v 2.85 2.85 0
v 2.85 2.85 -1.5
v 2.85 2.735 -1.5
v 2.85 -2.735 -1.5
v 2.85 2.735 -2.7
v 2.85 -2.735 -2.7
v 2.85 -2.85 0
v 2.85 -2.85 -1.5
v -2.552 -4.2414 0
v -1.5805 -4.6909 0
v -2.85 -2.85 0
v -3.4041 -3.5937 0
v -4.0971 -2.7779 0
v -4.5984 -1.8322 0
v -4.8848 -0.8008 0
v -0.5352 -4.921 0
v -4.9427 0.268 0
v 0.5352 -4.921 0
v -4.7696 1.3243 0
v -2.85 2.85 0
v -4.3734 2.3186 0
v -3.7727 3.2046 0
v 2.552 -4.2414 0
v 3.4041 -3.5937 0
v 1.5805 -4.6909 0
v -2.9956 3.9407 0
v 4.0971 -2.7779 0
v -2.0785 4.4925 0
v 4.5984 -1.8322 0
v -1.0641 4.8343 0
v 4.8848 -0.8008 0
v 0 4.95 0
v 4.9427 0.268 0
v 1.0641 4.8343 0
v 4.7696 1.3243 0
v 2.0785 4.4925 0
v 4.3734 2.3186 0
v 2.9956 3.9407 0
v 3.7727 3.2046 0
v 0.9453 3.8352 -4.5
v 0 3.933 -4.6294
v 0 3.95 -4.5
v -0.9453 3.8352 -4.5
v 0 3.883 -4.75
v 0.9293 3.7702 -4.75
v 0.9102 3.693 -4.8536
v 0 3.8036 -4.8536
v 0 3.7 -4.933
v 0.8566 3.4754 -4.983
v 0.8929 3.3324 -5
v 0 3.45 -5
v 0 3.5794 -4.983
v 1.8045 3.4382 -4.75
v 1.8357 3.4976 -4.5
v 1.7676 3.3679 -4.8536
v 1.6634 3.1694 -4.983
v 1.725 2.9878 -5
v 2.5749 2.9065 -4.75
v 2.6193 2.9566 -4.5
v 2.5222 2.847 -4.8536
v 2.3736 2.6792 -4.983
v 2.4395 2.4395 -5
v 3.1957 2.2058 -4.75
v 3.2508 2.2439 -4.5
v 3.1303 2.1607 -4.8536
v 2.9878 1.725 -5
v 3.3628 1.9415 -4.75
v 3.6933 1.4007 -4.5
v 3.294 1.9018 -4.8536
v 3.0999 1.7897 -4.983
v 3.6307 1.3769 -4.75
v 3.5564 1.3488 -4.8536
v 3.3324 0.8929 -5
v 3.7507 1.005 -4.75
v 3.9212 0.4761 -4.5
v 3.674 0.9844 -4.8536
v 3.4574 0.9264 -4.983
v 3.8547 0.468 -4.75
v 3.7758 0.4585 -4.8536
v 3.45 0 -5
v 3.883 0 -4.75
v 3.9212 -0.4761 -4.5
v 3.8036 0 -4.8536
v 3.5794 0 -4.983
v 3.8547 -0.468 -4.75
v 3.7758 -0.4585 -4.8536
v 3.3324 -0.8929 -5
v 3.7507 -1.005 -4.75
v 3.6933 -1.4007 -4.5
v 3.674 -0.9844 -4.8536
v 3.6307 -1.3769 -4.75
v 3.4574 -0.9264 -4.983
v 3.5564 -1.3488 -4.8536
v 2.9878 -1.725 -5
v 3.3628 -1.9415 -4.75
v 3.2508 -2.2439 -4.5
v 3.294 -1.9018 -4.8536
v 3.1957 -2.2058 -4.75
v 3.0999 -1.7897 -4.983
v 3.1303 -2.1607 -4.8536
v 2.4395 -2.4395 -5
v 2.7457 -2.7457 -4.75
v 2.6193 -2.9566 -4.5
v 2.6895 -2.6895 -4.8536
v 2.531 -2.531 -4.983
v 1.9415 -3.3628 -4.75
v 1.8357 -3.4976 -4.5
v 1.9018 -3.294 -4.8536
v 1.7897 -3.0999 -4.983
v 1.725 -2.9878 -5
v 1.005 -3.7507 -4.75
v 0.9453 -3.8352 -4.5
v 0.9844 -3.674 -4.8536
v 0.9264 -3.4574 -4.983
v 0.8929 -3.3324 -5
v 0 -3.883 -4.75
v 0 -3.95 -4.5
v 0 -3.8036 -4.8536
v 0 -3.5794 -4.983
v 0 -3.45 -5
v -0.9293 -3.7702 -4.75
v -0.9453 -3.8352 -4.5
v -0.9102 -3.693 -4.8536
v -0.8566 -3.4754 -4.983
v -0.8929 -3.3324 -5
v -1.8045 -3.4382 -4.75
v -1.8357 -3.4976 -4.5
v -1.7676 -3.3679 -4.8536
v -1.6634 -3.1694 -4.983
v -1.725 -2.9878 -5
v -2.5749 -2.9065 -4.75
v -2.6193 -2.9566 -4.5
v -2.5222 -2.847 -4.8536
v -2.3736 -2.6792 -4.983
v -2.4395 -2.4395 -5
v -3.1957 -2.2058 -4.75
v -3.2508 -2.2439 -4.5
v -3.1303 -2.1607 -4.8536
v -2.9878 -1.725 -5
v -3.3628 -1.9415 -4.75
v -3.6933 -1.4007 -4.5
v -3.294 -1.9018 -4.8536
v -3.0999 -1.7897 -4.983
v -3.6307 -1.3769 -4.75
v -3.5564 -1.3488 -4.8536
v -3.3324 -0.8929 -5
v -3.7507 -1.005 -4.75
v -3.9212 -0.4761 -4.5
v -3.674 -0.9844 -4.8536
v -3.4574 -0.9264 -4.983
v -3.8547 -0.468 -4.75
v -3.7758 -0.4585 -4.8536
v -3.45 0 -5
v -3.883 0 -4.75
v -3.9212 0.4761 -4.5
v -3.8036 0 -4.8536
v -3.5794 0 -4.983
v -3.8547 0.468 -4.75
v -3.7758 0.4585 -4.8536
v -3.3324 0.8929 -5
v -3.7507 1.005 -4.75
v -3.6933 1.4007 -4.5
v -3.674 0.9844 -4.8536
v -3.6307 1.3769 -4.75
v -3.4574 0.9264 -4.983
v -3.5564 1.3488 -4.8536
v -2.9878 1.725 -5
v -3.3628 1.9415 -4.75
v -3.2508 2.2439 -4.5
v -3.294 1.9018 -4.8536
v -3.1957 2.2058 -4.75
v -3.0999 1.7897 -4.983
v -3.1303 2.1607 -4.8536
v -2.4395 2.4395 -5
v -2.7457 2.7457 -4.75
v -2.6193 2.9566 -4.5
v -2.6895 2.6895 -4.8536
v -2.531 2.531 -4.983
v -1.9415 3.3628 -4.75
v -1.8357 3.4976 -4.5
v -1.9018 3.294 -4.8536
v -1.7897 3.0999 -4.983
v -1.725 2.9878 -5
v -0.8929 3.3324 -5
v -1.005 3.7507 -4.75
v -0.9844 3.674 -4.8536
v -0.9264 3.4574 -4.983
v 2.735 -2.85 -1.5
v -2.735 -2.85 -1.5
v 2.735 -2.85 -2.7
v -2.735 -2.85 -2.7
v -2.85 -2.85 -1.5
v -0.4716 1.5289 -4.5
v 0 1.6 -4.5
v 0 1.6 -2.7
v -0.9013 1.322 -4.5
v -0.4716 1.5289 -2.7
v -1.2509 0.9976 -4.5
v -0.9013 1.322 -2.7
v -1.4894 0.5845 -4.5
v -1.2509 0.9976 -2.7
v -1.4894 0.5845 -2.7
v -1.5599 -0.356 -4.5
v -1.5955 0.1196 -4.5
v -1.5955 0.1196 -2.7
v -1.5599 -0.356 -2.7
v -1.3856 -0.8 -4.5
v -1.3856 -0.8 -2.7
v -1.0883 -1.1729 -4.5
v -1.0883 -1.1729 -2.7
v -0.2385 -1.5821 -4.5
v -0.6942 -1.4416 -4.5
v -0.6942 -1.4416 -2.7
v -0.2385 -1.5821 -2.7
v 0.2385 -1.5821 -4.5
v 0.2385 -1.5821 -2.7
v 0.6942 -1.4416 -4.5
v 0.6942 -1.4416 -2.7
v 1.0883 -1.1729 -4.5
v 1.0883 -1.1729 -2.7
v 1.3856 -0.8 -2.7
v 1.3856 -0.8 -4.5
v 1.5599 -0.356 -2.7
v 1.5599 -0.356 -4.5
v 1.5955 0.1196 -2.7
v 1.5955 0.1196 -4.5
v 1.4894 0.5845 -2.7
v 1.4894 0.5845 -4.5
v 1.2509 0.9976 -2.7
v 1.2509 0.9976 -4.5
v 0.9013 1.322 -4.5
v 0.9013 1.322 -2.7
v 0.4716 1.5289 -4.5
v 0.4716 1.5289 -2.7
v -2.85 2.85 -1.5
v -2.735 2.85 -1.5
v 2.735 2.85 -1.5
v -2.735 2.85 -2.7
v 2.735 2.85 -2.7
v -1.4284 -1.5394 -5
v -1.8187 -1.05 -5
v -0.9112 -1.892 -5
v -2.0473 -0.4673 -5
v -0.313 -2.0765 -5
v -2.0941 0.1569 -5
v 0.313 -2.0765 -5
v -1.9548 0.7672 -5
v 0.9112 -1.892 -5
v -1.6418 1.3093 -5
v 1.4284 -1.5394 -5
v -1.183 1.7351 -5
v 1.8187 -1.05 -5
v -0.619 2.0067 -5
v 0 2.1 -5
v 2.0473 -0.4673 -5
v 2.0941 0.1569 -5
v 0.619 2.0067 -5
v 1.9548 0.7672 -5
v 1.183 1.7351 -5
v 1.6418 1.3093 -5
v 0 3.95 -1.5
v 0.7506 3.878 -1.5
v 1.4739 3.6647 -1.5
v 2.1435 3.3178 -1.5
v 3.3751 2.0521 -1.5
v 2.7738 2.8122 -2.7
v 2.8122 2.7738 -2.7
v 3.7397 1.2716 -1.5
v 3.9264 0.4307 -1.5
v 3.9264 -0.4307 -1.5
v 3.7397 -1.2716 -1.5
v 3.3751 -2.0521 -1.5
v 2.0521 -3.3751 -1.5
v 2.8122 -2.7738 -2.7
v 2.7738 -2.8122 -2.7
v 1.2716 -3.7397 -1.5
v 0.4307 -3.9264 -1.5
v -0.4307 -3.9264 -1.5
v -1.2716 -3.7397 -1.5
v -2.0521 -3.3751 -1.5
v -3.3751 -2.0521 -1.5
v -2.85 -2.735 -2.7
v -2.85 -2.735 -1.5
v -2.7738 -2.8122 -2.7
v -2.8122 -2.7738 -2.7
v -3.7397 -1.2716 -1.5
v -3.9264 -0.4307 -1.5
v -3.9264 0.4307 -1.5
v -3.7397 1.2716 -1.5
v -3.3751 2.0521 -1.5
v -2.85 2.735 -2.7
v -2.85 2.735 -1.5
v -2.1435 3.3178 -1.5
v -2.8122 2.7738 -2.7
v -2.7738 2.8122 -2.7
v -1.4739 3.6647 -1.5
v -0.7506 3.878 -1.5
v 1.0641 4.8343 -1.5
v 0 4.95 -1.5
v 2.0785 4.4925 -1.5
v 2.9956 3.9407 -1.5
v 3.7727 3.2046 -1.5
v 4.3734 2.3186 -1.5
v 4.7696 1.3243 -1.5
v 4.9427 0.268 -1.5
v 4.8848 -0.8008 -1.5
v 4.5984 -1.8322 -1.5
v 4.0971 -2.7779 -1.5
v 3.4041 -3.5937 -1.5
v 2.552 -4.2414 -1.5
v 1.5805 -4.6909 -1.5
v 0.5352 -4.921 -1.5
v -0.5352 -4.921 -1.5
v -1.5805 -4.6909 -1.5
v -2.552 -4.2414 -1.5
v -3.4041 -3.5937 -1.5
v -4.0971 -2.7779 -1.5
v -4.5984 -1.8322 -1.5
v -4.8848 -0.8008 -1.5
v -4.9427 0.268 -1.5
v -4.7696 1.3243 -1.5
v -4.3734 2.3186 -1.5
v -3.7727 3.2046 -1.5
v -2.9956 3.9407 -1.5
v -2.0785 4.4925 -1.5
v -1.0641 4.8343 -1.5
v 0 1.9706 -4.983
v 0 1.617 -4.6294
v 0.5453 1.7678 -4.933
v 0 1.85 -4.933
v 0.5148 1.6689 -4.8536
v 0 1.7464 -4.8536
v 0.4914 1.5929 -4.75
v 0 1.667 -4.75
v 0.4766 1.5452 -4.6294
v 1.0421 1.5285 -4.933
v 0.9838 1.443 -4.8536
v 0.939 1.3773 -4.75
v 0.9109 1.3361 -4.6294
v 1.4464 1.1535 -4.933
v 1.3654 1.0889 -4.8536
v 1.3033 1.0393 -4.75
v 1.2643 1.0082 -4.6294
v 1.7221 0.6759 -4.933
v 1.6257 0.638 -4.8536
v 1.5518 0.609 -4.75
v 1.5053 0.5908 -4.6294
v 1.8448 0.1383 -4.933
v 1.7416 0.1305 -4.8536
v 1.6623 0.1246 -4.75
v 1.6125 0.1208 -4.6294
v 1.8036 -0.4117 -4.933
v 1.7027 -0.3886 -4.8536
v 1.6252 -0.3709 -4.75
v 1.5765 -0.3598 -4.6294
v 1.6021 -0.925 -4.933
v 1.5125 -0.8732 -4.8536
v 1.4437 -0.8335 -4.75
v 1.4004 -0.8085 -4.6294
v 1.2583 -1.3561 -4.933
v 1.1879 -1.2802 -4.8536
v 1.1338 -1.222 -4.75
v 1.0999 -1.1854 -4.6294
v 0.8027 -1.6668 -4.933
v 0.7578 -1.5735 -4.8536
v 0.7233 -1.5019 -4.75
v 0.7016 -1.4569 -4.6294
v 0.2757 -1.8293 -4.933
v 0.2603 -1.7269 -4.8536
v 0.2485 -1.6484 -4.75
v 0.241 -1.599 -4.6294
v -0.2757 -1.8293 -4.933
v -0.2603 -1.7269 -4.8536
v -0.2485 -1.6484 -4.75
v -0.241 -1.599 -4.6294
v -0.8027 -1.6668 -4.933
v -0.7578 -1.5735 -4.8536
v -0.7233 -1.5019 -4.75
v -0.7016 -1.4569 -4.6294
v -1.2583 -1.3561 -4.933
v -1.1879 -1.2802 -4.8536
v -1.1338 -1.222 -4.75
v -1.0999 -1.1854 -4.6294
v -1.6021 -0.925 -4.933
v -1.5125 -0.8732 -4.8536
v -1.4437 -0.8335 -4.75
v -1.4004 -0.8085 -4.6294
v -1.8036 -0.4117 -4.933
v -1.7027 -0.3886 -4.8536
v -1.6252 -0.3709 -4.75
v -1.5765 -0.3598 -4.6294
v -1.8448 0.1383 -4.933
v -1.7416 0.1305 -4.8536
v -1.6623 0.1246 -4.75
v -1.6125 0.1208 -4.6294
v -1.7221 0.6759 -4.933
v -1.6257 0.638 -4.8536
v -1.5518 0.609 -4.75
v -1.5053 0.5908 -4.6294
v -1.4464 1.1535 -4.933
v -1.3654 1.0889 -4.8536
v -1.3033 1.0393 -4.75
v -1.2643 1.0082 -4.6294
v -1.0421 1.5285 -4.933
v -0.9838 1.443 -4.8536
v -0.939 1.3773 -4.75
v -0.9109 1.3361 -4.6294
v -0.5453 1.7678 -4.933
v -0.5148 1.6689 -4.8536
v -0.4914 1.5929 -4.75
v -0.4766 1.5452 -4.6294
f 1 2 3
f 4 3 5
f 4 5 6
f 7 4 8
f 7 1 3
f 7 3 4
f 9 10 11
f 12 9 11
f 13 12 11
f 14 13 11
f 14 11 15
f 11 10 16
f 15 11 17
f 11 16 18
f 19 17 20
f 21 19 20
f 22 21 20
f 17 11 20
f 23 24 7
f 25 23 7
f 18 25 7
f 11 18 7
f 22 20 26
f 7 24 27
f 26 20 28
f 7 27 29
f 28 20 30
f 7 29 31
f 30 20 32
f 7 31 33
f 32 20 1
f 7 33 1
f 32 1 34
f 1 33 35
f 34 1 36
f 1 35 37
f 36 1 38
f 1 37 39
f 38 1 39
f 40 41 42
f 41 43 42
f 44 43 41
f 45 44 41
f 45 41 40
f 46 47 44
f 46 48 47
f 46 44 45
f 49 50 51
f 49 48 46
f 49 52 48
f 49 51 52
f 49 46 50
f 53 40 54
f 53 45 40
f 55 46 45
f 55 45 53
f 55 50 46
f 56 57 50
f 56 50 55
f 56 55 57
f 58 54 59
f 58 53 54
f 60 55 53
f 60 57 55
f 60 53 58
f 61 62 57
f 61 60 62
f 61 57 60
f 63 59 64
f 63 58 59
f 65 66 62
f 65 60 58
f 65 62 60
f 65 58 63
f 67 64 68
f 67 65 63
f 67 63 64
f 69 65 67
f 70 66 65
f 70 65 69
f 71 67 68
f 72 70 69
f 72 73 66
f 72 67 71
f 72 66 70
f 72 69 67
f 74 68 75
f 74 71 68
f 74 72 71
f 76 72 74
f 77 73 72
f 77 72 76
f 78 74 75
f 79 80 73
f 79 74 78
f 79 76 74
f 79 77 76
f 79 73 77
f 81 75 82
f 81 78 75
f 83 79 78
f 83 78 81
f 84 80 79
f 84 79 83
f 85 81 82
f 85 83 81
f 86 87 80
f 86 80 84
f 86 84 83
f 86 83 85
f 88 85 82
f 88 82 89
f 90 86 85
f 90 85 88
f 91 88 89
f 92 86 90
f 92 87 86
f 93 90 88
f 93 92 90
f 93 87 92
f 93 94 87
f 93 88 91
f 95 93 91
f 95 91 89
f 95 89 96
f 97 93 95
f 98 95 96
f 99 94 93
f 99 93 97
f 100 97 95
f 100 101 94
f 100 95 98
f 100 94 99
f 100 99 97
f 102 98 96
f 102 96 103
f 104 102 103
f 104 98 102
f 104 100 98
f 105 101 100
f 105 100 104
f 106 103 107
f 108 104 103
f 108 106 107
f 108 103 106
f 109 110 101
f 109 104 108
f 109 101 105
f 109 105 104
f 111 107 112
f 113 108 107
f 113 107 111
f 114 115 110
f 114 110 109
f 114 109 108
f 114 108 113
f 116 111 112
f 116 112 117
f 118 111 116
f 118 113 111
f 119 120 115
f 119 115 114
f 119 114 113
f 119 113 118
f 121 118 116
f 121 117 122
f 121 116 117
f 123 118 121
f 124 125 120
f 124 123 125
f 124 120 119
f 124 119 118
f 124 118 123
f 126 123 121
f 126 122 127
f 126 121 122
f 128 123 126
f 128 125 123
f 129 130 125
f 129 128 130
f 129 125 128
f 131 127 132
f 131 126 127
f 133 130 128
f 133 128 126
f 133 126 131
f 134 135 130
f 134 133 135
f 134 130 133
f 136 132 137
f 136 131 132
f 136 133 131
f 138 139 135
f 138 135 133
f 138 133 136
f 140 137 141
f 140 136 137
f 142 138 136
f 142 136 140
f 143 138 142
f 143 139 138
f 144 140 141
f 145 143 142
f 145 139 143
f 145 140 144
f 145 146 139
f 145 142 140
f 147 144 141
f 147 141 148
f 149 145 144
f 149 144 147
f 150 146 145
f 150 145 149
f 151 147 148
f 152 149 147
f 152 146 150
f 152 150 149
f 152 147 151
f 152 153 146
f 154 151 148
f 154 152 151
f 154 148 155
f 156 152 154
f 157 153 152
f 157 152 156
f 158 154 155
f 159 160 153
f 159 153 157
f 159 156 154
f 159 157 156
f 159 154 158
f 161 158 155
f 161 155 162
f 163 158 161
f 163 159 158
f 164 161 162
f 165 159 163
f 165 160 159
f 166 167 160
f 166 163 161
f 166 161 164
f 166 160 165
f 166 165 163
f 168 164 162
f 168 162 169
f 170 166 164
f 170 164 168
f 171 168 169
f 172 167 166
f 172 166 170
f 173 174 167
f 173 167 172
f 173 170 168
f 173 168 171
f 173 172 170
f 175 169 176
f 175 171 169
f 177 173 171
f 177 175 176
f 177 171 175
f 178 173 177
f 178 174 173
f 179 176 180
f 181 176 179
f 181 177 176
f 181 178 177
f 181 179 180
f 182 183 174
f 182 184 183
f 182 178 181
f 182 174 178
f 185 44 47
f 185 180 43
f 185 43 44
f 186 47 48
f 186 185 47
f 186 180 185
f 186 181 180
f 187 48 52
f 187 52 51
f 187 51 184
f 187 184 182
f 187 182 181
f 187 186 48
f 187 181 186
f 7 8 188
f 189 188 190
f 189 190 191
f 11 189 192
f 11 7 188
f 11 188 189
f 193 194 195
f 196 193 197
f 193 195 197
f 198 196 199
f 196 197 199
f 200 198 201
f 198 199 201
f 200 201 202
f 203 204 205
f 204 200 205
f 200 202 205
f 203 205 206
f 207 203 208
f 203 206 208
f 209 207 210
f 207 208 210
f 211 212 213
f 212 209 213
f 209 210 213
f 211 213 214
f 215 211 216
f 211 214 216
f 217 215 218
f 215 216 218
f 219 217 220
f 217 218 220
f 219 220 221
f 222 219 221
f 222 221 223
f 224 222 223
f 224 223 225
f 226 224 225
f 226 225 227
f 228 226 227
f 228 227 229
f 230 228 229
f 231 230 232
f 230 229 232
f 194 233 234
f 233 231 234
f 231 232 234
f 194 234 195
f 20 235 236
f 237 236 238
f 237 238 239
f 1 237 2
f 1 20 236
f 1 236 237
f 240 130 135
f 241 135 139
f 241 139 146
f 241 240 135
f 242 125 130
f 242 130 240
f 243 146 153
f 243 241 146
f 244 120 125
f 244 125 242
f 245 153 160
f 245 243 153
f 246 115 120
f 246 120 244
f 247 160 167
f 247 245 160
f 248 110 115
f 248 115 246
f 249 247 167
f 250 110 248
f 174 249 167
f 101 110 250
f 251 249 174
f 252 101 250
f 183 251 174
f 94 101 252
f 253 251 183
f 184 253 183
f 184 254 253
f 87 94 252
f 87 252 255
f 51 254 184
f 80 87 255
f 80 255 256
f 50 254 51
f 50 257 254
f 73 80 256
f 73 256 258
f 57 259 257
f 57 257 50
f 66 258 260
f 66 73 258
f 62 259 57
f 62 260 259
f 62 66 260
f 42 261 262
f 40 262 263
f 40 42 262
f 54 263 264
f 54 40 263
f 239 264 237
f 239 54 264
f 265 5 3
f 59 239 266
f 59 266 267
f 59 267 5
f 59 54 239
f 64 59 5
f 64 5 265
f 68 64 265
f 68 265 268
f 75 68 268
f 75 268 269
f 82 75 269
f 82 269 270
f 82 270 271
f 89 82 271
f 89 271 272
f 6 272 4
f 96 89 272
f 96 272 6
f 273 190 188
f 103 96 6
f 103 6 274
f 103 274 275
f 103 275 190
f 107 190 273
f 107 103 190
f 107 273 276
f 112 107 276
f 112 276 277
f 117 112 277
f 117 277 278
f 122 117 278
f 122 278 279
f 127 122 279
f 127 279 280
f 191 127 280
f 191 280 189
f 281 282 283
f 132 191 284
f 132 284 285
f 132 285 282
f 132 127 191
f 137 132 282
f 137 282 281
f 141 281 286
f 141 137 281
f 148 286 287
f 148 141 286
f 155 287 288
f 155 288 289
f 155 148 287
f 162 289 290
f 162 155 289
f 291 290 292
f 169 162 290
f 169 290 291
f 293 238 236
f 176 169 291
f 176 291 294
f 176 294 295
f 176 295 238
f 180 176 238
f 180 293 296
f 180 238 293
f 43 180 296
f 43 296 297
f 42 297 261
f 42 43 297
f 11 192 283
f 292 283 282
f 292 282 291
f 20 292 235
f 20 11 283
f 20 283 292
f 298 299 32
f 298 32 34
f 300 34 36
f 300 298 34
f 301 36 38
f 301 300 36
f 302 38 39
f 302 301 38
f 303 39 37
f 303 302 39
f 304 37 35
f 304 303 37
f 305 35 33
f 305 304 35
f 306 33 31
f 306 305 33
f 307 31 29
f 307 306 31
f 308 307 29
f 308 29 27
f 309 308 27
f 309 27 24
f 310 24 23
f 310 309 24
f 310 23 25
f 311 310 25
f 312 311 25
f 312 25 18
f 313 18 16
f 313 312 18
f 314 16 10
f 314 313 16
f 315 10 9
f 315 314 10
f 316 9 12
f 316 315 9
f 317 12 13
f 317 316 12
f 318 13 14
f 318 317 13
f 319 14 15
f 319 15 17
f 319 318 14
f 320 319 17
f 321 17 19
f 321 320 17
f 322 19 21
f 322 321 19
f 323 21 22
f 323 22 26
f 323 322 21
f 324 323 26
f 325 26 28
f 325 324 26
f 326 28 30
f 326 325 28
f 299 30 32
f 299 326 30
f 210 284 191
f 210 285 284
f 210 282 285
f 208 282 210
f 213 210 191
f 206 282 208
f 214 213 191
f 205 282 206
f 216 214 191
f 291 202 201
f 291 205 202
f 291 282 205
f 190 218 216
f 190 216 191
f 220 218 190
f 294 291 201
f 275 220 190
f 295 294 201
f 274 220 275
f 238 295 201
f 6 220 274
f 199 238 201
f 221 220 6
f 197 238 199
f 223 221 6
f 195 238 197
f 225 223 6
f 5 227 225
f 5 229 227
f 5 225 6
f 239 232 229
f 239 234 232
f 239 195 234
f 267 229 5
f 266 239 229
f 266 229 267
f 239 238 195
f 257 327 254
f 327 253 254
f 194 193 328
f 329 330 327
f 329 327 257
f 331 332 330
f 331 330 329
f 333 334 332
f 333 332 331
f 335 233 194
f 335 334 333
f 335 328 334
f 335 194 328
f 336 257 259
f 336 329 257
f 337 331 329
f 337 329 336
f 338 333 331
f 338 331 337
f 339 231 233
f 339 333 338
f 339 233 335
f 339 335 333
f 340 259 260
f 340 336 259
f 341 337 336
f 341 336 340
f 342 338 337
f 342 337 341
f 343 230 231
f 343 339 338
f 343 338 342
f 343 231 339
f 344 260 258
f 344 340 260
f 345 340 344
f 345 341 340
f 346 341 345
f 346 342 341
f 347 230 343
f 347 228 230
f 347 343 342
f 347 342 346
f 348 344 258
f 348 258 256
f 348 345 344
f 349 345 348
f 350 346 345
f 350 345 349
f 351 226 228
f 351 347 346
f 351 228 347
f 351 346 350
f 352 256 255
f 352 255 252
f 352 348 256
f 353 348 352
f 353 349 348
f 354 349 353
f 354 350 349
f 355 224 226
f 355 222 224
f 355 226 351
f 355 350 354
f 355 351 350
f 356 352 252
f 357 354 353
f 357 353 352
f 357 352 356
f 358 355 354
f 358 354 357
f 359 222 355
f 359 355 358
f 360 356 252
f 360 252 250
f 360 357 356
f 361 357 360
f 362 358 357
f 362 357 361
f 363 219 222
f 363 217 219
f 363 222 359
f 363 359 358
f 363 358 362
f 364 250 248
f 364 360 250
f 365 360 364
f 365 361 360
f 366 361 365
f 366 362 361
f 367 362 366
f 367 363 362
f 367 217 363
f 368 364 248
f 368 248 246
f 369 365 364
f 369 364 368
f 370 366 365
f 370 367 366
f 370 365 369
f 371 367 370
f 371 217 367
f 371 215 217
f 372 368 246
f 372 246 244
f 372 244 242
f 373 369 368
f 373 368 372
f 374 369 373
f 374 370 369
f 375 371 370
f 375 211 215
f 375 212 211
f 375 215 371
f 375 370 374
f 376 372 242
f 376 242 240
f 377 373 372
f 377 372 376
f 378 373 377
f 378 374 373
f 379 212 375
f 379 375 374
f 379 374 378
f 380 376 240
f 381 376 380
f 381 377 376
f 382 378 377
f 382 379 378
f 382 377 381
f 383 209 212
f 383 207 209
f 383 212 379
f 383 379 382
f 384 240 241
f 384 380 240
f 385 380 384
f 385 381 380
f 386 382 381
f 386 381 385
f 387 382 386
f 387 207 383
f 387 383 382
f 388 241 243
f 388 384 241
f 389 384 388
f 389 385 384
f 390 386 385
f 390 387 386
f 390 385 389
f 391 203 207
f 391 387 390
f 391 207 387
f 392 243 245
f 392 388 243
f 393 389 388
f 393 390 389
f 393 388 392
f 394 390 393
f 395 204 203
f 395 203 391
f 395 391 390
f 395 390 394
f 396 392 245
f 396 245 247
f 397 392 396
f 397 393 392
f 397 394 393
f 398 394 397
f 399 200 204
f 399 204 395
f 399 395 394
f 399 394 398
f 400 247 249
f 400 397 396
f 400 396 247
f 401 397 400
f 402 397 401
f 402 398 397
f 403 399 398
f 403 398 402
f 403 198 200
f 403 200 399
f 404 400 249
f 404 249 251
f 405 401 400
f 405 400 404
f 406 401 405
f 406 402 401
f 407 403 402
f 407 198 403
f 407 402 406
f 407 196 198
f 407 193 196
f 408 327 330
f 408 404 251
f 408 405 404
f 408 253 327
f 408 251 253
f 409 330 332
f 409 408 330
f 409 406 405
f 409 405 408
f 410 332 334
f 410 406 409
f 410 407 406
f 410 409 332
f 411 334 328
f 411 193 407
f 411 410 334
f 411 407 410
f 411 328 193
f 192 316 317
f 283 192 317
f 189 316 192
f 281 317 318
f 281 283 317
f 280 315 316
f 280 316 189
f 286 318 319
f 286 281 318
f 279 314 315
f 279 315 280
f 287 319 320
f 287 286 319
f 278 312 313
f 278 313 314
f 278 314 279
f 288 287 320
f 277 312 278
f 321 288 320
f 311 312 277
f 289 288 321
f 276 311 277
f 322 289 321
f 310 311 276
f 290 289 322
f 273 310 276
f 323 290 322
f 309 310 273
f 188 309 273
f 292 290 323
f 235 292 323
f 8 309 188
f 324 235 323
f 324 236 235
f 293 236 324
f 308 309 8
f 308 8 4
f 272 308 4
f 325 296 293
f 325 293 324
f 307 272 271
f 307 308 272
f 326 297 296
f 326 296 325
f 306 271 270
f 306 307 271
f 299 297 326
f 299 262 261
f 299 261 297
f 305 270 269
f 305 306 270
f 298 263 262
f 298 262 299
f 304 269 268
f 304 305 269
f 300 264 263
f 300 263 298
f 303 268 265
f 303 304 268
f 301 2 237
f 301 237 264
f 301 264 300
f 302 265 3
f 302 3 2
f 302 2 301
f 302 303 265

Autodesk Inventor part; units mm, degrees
ref_plane "YZ Plane" through (0, 0, 0) normal (1, 0, 0) x (0, 1, 0)
ref_plane "XZ Plane" through (0, 0, 0) normal (0, 1, 0) x (-1, 0, 0)
ref_plane "XY Plane" through (0, 0, 0) normal (0, 0, 1) x (1, 0, 0)
sketch "Sketch1" plane through (0, 0, 0) normal (1, 0, 0) x (0, 1, 0)
  line L0 (0, 0) -> (1.6, 0) construction
  line L1 (1.6, 0) -> (4.95, 0)
  line L2 (4.95, 0) -> (4.95, -1.5)
  line L3 (4.95, -1.5) -> (3.95, -1.5)
  line L4 (3.95, -1.5) -> (3.95, -5)
  line L5 (3.95, -5) -> (1.6, -5)
  line L6 (1.6, -5) -> (1.6, 0)
  line L7 (0, 0) -> (0, -13.7466) construction
  dimension "d0" = 1.6
  dimension "d1" = 3.95
  dimension "d2" = 1
  dimension "d3" = 1.5
  dimension "d4" = 3.5
revolve "Revolution1" add sketch "Sketch1" angle 360 about axis through (0, 0, 0) along (0, 0, -1)
sketch "Sketch2" plane through (0, 0, 0) normal (0, 0, 1) x (1, 0, 0)
  line L0 (2.85, -2.85) -> (-2.85, -2.85)
  line L1 (-2.85, -2.85) -> (-2.85, 2.85)
  line L2 (-2.85, 2.85) -> (2.85, 2.85)
  line L3 (2.85, 2.85) -> (2.85, -2.85)
  line L4 (2.85, -2.85) -> (-2.85, 2.85) construction
  line L5 (-2.85, -2.85) -> (2.85, 2.85) construction
  point P0 (0, 0)
  dimension "d6" = 5.7
extrude "Extrusion1" cut sketch "Sketch2" against normal blind 2.7
fillet "Fillet1" radius 0.5 2 edges at (0, -3.95, -5) (0, -1.6, -5)
properties part number "HD_BearingShaft1"
